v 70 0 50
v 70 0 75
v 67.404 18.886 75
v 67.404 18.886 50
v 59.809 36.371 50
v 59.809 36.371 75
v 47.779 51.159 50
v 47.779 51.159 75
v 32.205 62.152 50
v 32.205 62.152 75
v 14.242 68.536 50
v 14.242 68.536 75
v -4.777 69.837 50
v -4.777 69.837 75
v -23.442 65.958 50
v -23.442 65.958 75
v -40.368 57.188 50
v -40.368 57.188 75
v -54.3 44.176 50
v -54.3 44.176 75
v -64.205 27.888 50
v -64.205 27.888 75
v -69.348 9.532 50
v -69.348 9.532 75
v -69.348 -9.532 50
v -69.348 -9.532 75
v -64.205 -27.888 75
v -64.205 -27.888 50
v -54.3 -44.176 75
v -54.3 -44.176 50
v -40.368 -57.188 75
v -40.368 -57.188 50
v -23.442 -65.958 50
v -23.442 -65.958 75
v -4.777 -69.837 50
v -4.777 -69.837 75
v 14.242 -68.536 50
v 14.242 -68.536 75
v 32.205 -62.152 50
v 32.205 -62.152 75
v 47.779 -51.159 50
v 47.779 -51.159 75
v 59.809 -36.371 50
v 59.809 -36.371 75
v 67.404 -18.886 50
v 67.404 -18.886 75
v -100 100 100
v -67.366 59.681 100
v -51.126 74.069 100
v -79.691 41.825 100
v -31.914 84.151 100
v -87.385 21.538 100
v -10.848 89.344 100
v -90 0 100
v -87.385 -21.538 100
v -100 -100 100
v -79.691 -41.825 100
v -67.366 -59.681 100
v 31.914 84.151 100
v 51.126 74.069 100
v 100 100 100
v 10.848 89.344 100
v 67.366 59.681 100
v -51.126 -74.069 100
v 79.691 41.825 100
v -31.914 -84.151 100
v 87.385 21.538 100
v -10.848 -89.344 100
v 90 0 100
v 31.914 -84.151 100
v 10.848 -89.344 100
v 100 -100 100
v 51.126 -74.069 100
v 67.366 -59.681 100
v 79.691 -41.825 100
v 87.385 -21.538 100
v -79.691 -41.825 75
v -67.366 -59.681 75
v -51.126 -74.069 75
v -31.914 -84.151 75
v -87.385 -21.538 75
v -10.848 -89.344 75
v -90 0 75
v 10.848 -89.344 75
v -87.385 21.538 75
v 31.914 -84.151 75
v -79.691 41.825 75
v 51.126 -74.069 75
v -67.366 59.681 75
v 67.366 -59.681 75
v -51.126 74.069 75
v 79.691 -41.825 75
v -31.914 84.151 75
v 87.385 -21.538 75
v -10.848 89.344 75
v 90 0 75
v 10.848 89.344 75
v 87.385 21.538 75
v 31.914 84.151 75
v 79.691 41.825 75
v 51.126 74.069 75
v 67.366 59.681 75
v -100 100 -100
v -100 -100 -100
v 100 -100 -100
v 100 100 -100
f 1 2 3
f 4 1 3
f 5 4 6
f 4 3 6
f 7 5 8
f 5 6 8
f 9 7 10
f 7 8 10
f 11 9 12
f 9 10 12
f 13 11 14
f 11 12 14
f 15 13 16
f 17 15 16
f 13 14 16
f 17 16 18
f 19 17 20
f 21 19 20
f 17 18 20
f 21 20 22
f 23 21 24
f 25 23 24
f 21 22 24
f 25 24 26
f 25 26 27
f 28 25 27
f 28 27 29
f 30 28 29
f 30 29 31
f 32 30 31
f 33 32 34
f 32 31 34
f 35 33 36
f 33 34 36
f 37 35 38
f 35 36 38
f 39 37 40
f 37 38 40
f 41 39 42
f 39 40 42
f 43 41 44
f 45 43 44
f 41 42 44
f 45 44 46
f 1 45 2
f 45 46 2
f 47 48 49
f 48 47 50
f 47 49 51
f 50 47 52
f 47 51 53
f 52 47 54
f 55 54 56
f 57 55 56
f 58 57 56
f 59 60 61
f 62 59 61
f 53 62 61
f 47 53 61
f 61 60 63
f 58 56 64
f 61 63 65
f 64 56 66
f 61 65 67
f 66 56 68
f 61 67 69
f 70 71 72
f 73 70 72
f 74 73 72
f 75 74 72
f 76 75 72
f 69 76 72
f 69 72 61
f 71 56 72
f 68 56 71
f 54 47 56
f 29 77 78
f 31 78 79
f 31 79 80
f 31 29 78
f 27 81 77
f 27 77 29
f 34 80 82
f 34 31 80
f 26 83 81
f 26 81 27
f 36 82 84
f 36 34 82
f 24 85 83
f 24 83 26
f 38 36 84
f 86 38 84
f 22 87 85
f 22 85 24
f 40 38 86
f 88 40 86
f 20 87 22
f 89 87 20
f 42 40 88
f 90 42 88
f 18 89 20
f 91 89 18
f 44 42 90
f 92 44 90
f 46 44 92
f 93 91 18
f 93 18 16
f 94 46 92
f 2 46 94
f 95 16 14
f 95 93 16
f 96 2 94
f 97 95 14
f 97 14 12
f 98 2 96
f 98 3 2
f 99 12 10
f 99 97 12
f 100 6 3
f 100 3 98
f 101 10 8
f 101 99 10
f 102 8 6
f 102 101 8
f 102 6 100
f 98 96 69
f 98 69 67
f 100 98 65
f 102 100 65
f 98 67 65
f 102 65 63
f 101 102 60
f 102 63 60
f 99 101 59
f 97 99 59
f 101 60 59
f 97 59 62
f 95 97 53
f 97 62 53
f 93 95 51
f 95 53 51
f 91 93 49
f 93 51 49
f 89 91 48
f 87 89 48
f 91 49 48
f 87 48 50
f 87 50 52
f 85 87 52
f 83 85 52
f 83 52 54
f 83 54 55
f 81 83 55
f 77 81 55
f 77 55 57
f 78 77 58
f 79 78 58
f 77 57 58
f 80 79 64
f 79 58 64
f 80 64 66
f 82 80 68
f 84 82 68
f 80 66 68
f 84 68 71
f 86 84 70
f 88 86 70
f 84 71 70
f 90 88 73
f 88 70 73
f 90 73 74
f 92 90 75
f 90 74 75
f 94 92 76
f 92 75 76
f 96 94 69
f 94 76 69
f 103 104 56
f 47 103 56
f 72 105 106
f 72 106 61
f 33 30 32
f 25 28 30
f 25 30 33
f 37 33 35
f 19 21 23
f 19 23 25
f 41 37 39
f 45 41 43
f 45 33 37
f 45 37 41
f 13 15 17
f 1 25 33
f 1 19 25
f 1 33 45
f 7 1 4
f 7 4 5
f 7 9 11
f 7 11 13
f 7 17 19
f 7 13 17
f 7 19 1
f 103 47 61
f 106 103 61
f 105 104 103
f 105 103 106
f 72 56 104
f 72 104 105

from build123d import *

# Parameters (mm, degrees)
F0_W     = 200
F0_H     = 200
F1_DEPTH = 100
F2_R     = 90
F3_DEPTH = 25
F4_R     = 70
F5_DEPTH = 25


with BuildPart() as f1:
    # F0 (on Front) → F1 (new body, symmetric)
    with BuildSketch(Plane.XZ):
        Rectangle(F0_W, F0_H)
    extrude(amount=F1_DEPTH, both=True)

    # F2 (on face) → F3 (cut)
    with BuildSketch(Plane.XY.offset(100)):
        Circle(F2_R)
    extrude(amount=-F3_DEPTH, mode=Mode.SUBTRACT)

    # F4 (on face) → F5 (cut)
    with BuildSketch(Plane.XY.offset(75)):
        Circle(F4_R)
    extrude(amount=-F5_DEPTH, mode=Mode.SUBTRACT)


solid = f1.part
